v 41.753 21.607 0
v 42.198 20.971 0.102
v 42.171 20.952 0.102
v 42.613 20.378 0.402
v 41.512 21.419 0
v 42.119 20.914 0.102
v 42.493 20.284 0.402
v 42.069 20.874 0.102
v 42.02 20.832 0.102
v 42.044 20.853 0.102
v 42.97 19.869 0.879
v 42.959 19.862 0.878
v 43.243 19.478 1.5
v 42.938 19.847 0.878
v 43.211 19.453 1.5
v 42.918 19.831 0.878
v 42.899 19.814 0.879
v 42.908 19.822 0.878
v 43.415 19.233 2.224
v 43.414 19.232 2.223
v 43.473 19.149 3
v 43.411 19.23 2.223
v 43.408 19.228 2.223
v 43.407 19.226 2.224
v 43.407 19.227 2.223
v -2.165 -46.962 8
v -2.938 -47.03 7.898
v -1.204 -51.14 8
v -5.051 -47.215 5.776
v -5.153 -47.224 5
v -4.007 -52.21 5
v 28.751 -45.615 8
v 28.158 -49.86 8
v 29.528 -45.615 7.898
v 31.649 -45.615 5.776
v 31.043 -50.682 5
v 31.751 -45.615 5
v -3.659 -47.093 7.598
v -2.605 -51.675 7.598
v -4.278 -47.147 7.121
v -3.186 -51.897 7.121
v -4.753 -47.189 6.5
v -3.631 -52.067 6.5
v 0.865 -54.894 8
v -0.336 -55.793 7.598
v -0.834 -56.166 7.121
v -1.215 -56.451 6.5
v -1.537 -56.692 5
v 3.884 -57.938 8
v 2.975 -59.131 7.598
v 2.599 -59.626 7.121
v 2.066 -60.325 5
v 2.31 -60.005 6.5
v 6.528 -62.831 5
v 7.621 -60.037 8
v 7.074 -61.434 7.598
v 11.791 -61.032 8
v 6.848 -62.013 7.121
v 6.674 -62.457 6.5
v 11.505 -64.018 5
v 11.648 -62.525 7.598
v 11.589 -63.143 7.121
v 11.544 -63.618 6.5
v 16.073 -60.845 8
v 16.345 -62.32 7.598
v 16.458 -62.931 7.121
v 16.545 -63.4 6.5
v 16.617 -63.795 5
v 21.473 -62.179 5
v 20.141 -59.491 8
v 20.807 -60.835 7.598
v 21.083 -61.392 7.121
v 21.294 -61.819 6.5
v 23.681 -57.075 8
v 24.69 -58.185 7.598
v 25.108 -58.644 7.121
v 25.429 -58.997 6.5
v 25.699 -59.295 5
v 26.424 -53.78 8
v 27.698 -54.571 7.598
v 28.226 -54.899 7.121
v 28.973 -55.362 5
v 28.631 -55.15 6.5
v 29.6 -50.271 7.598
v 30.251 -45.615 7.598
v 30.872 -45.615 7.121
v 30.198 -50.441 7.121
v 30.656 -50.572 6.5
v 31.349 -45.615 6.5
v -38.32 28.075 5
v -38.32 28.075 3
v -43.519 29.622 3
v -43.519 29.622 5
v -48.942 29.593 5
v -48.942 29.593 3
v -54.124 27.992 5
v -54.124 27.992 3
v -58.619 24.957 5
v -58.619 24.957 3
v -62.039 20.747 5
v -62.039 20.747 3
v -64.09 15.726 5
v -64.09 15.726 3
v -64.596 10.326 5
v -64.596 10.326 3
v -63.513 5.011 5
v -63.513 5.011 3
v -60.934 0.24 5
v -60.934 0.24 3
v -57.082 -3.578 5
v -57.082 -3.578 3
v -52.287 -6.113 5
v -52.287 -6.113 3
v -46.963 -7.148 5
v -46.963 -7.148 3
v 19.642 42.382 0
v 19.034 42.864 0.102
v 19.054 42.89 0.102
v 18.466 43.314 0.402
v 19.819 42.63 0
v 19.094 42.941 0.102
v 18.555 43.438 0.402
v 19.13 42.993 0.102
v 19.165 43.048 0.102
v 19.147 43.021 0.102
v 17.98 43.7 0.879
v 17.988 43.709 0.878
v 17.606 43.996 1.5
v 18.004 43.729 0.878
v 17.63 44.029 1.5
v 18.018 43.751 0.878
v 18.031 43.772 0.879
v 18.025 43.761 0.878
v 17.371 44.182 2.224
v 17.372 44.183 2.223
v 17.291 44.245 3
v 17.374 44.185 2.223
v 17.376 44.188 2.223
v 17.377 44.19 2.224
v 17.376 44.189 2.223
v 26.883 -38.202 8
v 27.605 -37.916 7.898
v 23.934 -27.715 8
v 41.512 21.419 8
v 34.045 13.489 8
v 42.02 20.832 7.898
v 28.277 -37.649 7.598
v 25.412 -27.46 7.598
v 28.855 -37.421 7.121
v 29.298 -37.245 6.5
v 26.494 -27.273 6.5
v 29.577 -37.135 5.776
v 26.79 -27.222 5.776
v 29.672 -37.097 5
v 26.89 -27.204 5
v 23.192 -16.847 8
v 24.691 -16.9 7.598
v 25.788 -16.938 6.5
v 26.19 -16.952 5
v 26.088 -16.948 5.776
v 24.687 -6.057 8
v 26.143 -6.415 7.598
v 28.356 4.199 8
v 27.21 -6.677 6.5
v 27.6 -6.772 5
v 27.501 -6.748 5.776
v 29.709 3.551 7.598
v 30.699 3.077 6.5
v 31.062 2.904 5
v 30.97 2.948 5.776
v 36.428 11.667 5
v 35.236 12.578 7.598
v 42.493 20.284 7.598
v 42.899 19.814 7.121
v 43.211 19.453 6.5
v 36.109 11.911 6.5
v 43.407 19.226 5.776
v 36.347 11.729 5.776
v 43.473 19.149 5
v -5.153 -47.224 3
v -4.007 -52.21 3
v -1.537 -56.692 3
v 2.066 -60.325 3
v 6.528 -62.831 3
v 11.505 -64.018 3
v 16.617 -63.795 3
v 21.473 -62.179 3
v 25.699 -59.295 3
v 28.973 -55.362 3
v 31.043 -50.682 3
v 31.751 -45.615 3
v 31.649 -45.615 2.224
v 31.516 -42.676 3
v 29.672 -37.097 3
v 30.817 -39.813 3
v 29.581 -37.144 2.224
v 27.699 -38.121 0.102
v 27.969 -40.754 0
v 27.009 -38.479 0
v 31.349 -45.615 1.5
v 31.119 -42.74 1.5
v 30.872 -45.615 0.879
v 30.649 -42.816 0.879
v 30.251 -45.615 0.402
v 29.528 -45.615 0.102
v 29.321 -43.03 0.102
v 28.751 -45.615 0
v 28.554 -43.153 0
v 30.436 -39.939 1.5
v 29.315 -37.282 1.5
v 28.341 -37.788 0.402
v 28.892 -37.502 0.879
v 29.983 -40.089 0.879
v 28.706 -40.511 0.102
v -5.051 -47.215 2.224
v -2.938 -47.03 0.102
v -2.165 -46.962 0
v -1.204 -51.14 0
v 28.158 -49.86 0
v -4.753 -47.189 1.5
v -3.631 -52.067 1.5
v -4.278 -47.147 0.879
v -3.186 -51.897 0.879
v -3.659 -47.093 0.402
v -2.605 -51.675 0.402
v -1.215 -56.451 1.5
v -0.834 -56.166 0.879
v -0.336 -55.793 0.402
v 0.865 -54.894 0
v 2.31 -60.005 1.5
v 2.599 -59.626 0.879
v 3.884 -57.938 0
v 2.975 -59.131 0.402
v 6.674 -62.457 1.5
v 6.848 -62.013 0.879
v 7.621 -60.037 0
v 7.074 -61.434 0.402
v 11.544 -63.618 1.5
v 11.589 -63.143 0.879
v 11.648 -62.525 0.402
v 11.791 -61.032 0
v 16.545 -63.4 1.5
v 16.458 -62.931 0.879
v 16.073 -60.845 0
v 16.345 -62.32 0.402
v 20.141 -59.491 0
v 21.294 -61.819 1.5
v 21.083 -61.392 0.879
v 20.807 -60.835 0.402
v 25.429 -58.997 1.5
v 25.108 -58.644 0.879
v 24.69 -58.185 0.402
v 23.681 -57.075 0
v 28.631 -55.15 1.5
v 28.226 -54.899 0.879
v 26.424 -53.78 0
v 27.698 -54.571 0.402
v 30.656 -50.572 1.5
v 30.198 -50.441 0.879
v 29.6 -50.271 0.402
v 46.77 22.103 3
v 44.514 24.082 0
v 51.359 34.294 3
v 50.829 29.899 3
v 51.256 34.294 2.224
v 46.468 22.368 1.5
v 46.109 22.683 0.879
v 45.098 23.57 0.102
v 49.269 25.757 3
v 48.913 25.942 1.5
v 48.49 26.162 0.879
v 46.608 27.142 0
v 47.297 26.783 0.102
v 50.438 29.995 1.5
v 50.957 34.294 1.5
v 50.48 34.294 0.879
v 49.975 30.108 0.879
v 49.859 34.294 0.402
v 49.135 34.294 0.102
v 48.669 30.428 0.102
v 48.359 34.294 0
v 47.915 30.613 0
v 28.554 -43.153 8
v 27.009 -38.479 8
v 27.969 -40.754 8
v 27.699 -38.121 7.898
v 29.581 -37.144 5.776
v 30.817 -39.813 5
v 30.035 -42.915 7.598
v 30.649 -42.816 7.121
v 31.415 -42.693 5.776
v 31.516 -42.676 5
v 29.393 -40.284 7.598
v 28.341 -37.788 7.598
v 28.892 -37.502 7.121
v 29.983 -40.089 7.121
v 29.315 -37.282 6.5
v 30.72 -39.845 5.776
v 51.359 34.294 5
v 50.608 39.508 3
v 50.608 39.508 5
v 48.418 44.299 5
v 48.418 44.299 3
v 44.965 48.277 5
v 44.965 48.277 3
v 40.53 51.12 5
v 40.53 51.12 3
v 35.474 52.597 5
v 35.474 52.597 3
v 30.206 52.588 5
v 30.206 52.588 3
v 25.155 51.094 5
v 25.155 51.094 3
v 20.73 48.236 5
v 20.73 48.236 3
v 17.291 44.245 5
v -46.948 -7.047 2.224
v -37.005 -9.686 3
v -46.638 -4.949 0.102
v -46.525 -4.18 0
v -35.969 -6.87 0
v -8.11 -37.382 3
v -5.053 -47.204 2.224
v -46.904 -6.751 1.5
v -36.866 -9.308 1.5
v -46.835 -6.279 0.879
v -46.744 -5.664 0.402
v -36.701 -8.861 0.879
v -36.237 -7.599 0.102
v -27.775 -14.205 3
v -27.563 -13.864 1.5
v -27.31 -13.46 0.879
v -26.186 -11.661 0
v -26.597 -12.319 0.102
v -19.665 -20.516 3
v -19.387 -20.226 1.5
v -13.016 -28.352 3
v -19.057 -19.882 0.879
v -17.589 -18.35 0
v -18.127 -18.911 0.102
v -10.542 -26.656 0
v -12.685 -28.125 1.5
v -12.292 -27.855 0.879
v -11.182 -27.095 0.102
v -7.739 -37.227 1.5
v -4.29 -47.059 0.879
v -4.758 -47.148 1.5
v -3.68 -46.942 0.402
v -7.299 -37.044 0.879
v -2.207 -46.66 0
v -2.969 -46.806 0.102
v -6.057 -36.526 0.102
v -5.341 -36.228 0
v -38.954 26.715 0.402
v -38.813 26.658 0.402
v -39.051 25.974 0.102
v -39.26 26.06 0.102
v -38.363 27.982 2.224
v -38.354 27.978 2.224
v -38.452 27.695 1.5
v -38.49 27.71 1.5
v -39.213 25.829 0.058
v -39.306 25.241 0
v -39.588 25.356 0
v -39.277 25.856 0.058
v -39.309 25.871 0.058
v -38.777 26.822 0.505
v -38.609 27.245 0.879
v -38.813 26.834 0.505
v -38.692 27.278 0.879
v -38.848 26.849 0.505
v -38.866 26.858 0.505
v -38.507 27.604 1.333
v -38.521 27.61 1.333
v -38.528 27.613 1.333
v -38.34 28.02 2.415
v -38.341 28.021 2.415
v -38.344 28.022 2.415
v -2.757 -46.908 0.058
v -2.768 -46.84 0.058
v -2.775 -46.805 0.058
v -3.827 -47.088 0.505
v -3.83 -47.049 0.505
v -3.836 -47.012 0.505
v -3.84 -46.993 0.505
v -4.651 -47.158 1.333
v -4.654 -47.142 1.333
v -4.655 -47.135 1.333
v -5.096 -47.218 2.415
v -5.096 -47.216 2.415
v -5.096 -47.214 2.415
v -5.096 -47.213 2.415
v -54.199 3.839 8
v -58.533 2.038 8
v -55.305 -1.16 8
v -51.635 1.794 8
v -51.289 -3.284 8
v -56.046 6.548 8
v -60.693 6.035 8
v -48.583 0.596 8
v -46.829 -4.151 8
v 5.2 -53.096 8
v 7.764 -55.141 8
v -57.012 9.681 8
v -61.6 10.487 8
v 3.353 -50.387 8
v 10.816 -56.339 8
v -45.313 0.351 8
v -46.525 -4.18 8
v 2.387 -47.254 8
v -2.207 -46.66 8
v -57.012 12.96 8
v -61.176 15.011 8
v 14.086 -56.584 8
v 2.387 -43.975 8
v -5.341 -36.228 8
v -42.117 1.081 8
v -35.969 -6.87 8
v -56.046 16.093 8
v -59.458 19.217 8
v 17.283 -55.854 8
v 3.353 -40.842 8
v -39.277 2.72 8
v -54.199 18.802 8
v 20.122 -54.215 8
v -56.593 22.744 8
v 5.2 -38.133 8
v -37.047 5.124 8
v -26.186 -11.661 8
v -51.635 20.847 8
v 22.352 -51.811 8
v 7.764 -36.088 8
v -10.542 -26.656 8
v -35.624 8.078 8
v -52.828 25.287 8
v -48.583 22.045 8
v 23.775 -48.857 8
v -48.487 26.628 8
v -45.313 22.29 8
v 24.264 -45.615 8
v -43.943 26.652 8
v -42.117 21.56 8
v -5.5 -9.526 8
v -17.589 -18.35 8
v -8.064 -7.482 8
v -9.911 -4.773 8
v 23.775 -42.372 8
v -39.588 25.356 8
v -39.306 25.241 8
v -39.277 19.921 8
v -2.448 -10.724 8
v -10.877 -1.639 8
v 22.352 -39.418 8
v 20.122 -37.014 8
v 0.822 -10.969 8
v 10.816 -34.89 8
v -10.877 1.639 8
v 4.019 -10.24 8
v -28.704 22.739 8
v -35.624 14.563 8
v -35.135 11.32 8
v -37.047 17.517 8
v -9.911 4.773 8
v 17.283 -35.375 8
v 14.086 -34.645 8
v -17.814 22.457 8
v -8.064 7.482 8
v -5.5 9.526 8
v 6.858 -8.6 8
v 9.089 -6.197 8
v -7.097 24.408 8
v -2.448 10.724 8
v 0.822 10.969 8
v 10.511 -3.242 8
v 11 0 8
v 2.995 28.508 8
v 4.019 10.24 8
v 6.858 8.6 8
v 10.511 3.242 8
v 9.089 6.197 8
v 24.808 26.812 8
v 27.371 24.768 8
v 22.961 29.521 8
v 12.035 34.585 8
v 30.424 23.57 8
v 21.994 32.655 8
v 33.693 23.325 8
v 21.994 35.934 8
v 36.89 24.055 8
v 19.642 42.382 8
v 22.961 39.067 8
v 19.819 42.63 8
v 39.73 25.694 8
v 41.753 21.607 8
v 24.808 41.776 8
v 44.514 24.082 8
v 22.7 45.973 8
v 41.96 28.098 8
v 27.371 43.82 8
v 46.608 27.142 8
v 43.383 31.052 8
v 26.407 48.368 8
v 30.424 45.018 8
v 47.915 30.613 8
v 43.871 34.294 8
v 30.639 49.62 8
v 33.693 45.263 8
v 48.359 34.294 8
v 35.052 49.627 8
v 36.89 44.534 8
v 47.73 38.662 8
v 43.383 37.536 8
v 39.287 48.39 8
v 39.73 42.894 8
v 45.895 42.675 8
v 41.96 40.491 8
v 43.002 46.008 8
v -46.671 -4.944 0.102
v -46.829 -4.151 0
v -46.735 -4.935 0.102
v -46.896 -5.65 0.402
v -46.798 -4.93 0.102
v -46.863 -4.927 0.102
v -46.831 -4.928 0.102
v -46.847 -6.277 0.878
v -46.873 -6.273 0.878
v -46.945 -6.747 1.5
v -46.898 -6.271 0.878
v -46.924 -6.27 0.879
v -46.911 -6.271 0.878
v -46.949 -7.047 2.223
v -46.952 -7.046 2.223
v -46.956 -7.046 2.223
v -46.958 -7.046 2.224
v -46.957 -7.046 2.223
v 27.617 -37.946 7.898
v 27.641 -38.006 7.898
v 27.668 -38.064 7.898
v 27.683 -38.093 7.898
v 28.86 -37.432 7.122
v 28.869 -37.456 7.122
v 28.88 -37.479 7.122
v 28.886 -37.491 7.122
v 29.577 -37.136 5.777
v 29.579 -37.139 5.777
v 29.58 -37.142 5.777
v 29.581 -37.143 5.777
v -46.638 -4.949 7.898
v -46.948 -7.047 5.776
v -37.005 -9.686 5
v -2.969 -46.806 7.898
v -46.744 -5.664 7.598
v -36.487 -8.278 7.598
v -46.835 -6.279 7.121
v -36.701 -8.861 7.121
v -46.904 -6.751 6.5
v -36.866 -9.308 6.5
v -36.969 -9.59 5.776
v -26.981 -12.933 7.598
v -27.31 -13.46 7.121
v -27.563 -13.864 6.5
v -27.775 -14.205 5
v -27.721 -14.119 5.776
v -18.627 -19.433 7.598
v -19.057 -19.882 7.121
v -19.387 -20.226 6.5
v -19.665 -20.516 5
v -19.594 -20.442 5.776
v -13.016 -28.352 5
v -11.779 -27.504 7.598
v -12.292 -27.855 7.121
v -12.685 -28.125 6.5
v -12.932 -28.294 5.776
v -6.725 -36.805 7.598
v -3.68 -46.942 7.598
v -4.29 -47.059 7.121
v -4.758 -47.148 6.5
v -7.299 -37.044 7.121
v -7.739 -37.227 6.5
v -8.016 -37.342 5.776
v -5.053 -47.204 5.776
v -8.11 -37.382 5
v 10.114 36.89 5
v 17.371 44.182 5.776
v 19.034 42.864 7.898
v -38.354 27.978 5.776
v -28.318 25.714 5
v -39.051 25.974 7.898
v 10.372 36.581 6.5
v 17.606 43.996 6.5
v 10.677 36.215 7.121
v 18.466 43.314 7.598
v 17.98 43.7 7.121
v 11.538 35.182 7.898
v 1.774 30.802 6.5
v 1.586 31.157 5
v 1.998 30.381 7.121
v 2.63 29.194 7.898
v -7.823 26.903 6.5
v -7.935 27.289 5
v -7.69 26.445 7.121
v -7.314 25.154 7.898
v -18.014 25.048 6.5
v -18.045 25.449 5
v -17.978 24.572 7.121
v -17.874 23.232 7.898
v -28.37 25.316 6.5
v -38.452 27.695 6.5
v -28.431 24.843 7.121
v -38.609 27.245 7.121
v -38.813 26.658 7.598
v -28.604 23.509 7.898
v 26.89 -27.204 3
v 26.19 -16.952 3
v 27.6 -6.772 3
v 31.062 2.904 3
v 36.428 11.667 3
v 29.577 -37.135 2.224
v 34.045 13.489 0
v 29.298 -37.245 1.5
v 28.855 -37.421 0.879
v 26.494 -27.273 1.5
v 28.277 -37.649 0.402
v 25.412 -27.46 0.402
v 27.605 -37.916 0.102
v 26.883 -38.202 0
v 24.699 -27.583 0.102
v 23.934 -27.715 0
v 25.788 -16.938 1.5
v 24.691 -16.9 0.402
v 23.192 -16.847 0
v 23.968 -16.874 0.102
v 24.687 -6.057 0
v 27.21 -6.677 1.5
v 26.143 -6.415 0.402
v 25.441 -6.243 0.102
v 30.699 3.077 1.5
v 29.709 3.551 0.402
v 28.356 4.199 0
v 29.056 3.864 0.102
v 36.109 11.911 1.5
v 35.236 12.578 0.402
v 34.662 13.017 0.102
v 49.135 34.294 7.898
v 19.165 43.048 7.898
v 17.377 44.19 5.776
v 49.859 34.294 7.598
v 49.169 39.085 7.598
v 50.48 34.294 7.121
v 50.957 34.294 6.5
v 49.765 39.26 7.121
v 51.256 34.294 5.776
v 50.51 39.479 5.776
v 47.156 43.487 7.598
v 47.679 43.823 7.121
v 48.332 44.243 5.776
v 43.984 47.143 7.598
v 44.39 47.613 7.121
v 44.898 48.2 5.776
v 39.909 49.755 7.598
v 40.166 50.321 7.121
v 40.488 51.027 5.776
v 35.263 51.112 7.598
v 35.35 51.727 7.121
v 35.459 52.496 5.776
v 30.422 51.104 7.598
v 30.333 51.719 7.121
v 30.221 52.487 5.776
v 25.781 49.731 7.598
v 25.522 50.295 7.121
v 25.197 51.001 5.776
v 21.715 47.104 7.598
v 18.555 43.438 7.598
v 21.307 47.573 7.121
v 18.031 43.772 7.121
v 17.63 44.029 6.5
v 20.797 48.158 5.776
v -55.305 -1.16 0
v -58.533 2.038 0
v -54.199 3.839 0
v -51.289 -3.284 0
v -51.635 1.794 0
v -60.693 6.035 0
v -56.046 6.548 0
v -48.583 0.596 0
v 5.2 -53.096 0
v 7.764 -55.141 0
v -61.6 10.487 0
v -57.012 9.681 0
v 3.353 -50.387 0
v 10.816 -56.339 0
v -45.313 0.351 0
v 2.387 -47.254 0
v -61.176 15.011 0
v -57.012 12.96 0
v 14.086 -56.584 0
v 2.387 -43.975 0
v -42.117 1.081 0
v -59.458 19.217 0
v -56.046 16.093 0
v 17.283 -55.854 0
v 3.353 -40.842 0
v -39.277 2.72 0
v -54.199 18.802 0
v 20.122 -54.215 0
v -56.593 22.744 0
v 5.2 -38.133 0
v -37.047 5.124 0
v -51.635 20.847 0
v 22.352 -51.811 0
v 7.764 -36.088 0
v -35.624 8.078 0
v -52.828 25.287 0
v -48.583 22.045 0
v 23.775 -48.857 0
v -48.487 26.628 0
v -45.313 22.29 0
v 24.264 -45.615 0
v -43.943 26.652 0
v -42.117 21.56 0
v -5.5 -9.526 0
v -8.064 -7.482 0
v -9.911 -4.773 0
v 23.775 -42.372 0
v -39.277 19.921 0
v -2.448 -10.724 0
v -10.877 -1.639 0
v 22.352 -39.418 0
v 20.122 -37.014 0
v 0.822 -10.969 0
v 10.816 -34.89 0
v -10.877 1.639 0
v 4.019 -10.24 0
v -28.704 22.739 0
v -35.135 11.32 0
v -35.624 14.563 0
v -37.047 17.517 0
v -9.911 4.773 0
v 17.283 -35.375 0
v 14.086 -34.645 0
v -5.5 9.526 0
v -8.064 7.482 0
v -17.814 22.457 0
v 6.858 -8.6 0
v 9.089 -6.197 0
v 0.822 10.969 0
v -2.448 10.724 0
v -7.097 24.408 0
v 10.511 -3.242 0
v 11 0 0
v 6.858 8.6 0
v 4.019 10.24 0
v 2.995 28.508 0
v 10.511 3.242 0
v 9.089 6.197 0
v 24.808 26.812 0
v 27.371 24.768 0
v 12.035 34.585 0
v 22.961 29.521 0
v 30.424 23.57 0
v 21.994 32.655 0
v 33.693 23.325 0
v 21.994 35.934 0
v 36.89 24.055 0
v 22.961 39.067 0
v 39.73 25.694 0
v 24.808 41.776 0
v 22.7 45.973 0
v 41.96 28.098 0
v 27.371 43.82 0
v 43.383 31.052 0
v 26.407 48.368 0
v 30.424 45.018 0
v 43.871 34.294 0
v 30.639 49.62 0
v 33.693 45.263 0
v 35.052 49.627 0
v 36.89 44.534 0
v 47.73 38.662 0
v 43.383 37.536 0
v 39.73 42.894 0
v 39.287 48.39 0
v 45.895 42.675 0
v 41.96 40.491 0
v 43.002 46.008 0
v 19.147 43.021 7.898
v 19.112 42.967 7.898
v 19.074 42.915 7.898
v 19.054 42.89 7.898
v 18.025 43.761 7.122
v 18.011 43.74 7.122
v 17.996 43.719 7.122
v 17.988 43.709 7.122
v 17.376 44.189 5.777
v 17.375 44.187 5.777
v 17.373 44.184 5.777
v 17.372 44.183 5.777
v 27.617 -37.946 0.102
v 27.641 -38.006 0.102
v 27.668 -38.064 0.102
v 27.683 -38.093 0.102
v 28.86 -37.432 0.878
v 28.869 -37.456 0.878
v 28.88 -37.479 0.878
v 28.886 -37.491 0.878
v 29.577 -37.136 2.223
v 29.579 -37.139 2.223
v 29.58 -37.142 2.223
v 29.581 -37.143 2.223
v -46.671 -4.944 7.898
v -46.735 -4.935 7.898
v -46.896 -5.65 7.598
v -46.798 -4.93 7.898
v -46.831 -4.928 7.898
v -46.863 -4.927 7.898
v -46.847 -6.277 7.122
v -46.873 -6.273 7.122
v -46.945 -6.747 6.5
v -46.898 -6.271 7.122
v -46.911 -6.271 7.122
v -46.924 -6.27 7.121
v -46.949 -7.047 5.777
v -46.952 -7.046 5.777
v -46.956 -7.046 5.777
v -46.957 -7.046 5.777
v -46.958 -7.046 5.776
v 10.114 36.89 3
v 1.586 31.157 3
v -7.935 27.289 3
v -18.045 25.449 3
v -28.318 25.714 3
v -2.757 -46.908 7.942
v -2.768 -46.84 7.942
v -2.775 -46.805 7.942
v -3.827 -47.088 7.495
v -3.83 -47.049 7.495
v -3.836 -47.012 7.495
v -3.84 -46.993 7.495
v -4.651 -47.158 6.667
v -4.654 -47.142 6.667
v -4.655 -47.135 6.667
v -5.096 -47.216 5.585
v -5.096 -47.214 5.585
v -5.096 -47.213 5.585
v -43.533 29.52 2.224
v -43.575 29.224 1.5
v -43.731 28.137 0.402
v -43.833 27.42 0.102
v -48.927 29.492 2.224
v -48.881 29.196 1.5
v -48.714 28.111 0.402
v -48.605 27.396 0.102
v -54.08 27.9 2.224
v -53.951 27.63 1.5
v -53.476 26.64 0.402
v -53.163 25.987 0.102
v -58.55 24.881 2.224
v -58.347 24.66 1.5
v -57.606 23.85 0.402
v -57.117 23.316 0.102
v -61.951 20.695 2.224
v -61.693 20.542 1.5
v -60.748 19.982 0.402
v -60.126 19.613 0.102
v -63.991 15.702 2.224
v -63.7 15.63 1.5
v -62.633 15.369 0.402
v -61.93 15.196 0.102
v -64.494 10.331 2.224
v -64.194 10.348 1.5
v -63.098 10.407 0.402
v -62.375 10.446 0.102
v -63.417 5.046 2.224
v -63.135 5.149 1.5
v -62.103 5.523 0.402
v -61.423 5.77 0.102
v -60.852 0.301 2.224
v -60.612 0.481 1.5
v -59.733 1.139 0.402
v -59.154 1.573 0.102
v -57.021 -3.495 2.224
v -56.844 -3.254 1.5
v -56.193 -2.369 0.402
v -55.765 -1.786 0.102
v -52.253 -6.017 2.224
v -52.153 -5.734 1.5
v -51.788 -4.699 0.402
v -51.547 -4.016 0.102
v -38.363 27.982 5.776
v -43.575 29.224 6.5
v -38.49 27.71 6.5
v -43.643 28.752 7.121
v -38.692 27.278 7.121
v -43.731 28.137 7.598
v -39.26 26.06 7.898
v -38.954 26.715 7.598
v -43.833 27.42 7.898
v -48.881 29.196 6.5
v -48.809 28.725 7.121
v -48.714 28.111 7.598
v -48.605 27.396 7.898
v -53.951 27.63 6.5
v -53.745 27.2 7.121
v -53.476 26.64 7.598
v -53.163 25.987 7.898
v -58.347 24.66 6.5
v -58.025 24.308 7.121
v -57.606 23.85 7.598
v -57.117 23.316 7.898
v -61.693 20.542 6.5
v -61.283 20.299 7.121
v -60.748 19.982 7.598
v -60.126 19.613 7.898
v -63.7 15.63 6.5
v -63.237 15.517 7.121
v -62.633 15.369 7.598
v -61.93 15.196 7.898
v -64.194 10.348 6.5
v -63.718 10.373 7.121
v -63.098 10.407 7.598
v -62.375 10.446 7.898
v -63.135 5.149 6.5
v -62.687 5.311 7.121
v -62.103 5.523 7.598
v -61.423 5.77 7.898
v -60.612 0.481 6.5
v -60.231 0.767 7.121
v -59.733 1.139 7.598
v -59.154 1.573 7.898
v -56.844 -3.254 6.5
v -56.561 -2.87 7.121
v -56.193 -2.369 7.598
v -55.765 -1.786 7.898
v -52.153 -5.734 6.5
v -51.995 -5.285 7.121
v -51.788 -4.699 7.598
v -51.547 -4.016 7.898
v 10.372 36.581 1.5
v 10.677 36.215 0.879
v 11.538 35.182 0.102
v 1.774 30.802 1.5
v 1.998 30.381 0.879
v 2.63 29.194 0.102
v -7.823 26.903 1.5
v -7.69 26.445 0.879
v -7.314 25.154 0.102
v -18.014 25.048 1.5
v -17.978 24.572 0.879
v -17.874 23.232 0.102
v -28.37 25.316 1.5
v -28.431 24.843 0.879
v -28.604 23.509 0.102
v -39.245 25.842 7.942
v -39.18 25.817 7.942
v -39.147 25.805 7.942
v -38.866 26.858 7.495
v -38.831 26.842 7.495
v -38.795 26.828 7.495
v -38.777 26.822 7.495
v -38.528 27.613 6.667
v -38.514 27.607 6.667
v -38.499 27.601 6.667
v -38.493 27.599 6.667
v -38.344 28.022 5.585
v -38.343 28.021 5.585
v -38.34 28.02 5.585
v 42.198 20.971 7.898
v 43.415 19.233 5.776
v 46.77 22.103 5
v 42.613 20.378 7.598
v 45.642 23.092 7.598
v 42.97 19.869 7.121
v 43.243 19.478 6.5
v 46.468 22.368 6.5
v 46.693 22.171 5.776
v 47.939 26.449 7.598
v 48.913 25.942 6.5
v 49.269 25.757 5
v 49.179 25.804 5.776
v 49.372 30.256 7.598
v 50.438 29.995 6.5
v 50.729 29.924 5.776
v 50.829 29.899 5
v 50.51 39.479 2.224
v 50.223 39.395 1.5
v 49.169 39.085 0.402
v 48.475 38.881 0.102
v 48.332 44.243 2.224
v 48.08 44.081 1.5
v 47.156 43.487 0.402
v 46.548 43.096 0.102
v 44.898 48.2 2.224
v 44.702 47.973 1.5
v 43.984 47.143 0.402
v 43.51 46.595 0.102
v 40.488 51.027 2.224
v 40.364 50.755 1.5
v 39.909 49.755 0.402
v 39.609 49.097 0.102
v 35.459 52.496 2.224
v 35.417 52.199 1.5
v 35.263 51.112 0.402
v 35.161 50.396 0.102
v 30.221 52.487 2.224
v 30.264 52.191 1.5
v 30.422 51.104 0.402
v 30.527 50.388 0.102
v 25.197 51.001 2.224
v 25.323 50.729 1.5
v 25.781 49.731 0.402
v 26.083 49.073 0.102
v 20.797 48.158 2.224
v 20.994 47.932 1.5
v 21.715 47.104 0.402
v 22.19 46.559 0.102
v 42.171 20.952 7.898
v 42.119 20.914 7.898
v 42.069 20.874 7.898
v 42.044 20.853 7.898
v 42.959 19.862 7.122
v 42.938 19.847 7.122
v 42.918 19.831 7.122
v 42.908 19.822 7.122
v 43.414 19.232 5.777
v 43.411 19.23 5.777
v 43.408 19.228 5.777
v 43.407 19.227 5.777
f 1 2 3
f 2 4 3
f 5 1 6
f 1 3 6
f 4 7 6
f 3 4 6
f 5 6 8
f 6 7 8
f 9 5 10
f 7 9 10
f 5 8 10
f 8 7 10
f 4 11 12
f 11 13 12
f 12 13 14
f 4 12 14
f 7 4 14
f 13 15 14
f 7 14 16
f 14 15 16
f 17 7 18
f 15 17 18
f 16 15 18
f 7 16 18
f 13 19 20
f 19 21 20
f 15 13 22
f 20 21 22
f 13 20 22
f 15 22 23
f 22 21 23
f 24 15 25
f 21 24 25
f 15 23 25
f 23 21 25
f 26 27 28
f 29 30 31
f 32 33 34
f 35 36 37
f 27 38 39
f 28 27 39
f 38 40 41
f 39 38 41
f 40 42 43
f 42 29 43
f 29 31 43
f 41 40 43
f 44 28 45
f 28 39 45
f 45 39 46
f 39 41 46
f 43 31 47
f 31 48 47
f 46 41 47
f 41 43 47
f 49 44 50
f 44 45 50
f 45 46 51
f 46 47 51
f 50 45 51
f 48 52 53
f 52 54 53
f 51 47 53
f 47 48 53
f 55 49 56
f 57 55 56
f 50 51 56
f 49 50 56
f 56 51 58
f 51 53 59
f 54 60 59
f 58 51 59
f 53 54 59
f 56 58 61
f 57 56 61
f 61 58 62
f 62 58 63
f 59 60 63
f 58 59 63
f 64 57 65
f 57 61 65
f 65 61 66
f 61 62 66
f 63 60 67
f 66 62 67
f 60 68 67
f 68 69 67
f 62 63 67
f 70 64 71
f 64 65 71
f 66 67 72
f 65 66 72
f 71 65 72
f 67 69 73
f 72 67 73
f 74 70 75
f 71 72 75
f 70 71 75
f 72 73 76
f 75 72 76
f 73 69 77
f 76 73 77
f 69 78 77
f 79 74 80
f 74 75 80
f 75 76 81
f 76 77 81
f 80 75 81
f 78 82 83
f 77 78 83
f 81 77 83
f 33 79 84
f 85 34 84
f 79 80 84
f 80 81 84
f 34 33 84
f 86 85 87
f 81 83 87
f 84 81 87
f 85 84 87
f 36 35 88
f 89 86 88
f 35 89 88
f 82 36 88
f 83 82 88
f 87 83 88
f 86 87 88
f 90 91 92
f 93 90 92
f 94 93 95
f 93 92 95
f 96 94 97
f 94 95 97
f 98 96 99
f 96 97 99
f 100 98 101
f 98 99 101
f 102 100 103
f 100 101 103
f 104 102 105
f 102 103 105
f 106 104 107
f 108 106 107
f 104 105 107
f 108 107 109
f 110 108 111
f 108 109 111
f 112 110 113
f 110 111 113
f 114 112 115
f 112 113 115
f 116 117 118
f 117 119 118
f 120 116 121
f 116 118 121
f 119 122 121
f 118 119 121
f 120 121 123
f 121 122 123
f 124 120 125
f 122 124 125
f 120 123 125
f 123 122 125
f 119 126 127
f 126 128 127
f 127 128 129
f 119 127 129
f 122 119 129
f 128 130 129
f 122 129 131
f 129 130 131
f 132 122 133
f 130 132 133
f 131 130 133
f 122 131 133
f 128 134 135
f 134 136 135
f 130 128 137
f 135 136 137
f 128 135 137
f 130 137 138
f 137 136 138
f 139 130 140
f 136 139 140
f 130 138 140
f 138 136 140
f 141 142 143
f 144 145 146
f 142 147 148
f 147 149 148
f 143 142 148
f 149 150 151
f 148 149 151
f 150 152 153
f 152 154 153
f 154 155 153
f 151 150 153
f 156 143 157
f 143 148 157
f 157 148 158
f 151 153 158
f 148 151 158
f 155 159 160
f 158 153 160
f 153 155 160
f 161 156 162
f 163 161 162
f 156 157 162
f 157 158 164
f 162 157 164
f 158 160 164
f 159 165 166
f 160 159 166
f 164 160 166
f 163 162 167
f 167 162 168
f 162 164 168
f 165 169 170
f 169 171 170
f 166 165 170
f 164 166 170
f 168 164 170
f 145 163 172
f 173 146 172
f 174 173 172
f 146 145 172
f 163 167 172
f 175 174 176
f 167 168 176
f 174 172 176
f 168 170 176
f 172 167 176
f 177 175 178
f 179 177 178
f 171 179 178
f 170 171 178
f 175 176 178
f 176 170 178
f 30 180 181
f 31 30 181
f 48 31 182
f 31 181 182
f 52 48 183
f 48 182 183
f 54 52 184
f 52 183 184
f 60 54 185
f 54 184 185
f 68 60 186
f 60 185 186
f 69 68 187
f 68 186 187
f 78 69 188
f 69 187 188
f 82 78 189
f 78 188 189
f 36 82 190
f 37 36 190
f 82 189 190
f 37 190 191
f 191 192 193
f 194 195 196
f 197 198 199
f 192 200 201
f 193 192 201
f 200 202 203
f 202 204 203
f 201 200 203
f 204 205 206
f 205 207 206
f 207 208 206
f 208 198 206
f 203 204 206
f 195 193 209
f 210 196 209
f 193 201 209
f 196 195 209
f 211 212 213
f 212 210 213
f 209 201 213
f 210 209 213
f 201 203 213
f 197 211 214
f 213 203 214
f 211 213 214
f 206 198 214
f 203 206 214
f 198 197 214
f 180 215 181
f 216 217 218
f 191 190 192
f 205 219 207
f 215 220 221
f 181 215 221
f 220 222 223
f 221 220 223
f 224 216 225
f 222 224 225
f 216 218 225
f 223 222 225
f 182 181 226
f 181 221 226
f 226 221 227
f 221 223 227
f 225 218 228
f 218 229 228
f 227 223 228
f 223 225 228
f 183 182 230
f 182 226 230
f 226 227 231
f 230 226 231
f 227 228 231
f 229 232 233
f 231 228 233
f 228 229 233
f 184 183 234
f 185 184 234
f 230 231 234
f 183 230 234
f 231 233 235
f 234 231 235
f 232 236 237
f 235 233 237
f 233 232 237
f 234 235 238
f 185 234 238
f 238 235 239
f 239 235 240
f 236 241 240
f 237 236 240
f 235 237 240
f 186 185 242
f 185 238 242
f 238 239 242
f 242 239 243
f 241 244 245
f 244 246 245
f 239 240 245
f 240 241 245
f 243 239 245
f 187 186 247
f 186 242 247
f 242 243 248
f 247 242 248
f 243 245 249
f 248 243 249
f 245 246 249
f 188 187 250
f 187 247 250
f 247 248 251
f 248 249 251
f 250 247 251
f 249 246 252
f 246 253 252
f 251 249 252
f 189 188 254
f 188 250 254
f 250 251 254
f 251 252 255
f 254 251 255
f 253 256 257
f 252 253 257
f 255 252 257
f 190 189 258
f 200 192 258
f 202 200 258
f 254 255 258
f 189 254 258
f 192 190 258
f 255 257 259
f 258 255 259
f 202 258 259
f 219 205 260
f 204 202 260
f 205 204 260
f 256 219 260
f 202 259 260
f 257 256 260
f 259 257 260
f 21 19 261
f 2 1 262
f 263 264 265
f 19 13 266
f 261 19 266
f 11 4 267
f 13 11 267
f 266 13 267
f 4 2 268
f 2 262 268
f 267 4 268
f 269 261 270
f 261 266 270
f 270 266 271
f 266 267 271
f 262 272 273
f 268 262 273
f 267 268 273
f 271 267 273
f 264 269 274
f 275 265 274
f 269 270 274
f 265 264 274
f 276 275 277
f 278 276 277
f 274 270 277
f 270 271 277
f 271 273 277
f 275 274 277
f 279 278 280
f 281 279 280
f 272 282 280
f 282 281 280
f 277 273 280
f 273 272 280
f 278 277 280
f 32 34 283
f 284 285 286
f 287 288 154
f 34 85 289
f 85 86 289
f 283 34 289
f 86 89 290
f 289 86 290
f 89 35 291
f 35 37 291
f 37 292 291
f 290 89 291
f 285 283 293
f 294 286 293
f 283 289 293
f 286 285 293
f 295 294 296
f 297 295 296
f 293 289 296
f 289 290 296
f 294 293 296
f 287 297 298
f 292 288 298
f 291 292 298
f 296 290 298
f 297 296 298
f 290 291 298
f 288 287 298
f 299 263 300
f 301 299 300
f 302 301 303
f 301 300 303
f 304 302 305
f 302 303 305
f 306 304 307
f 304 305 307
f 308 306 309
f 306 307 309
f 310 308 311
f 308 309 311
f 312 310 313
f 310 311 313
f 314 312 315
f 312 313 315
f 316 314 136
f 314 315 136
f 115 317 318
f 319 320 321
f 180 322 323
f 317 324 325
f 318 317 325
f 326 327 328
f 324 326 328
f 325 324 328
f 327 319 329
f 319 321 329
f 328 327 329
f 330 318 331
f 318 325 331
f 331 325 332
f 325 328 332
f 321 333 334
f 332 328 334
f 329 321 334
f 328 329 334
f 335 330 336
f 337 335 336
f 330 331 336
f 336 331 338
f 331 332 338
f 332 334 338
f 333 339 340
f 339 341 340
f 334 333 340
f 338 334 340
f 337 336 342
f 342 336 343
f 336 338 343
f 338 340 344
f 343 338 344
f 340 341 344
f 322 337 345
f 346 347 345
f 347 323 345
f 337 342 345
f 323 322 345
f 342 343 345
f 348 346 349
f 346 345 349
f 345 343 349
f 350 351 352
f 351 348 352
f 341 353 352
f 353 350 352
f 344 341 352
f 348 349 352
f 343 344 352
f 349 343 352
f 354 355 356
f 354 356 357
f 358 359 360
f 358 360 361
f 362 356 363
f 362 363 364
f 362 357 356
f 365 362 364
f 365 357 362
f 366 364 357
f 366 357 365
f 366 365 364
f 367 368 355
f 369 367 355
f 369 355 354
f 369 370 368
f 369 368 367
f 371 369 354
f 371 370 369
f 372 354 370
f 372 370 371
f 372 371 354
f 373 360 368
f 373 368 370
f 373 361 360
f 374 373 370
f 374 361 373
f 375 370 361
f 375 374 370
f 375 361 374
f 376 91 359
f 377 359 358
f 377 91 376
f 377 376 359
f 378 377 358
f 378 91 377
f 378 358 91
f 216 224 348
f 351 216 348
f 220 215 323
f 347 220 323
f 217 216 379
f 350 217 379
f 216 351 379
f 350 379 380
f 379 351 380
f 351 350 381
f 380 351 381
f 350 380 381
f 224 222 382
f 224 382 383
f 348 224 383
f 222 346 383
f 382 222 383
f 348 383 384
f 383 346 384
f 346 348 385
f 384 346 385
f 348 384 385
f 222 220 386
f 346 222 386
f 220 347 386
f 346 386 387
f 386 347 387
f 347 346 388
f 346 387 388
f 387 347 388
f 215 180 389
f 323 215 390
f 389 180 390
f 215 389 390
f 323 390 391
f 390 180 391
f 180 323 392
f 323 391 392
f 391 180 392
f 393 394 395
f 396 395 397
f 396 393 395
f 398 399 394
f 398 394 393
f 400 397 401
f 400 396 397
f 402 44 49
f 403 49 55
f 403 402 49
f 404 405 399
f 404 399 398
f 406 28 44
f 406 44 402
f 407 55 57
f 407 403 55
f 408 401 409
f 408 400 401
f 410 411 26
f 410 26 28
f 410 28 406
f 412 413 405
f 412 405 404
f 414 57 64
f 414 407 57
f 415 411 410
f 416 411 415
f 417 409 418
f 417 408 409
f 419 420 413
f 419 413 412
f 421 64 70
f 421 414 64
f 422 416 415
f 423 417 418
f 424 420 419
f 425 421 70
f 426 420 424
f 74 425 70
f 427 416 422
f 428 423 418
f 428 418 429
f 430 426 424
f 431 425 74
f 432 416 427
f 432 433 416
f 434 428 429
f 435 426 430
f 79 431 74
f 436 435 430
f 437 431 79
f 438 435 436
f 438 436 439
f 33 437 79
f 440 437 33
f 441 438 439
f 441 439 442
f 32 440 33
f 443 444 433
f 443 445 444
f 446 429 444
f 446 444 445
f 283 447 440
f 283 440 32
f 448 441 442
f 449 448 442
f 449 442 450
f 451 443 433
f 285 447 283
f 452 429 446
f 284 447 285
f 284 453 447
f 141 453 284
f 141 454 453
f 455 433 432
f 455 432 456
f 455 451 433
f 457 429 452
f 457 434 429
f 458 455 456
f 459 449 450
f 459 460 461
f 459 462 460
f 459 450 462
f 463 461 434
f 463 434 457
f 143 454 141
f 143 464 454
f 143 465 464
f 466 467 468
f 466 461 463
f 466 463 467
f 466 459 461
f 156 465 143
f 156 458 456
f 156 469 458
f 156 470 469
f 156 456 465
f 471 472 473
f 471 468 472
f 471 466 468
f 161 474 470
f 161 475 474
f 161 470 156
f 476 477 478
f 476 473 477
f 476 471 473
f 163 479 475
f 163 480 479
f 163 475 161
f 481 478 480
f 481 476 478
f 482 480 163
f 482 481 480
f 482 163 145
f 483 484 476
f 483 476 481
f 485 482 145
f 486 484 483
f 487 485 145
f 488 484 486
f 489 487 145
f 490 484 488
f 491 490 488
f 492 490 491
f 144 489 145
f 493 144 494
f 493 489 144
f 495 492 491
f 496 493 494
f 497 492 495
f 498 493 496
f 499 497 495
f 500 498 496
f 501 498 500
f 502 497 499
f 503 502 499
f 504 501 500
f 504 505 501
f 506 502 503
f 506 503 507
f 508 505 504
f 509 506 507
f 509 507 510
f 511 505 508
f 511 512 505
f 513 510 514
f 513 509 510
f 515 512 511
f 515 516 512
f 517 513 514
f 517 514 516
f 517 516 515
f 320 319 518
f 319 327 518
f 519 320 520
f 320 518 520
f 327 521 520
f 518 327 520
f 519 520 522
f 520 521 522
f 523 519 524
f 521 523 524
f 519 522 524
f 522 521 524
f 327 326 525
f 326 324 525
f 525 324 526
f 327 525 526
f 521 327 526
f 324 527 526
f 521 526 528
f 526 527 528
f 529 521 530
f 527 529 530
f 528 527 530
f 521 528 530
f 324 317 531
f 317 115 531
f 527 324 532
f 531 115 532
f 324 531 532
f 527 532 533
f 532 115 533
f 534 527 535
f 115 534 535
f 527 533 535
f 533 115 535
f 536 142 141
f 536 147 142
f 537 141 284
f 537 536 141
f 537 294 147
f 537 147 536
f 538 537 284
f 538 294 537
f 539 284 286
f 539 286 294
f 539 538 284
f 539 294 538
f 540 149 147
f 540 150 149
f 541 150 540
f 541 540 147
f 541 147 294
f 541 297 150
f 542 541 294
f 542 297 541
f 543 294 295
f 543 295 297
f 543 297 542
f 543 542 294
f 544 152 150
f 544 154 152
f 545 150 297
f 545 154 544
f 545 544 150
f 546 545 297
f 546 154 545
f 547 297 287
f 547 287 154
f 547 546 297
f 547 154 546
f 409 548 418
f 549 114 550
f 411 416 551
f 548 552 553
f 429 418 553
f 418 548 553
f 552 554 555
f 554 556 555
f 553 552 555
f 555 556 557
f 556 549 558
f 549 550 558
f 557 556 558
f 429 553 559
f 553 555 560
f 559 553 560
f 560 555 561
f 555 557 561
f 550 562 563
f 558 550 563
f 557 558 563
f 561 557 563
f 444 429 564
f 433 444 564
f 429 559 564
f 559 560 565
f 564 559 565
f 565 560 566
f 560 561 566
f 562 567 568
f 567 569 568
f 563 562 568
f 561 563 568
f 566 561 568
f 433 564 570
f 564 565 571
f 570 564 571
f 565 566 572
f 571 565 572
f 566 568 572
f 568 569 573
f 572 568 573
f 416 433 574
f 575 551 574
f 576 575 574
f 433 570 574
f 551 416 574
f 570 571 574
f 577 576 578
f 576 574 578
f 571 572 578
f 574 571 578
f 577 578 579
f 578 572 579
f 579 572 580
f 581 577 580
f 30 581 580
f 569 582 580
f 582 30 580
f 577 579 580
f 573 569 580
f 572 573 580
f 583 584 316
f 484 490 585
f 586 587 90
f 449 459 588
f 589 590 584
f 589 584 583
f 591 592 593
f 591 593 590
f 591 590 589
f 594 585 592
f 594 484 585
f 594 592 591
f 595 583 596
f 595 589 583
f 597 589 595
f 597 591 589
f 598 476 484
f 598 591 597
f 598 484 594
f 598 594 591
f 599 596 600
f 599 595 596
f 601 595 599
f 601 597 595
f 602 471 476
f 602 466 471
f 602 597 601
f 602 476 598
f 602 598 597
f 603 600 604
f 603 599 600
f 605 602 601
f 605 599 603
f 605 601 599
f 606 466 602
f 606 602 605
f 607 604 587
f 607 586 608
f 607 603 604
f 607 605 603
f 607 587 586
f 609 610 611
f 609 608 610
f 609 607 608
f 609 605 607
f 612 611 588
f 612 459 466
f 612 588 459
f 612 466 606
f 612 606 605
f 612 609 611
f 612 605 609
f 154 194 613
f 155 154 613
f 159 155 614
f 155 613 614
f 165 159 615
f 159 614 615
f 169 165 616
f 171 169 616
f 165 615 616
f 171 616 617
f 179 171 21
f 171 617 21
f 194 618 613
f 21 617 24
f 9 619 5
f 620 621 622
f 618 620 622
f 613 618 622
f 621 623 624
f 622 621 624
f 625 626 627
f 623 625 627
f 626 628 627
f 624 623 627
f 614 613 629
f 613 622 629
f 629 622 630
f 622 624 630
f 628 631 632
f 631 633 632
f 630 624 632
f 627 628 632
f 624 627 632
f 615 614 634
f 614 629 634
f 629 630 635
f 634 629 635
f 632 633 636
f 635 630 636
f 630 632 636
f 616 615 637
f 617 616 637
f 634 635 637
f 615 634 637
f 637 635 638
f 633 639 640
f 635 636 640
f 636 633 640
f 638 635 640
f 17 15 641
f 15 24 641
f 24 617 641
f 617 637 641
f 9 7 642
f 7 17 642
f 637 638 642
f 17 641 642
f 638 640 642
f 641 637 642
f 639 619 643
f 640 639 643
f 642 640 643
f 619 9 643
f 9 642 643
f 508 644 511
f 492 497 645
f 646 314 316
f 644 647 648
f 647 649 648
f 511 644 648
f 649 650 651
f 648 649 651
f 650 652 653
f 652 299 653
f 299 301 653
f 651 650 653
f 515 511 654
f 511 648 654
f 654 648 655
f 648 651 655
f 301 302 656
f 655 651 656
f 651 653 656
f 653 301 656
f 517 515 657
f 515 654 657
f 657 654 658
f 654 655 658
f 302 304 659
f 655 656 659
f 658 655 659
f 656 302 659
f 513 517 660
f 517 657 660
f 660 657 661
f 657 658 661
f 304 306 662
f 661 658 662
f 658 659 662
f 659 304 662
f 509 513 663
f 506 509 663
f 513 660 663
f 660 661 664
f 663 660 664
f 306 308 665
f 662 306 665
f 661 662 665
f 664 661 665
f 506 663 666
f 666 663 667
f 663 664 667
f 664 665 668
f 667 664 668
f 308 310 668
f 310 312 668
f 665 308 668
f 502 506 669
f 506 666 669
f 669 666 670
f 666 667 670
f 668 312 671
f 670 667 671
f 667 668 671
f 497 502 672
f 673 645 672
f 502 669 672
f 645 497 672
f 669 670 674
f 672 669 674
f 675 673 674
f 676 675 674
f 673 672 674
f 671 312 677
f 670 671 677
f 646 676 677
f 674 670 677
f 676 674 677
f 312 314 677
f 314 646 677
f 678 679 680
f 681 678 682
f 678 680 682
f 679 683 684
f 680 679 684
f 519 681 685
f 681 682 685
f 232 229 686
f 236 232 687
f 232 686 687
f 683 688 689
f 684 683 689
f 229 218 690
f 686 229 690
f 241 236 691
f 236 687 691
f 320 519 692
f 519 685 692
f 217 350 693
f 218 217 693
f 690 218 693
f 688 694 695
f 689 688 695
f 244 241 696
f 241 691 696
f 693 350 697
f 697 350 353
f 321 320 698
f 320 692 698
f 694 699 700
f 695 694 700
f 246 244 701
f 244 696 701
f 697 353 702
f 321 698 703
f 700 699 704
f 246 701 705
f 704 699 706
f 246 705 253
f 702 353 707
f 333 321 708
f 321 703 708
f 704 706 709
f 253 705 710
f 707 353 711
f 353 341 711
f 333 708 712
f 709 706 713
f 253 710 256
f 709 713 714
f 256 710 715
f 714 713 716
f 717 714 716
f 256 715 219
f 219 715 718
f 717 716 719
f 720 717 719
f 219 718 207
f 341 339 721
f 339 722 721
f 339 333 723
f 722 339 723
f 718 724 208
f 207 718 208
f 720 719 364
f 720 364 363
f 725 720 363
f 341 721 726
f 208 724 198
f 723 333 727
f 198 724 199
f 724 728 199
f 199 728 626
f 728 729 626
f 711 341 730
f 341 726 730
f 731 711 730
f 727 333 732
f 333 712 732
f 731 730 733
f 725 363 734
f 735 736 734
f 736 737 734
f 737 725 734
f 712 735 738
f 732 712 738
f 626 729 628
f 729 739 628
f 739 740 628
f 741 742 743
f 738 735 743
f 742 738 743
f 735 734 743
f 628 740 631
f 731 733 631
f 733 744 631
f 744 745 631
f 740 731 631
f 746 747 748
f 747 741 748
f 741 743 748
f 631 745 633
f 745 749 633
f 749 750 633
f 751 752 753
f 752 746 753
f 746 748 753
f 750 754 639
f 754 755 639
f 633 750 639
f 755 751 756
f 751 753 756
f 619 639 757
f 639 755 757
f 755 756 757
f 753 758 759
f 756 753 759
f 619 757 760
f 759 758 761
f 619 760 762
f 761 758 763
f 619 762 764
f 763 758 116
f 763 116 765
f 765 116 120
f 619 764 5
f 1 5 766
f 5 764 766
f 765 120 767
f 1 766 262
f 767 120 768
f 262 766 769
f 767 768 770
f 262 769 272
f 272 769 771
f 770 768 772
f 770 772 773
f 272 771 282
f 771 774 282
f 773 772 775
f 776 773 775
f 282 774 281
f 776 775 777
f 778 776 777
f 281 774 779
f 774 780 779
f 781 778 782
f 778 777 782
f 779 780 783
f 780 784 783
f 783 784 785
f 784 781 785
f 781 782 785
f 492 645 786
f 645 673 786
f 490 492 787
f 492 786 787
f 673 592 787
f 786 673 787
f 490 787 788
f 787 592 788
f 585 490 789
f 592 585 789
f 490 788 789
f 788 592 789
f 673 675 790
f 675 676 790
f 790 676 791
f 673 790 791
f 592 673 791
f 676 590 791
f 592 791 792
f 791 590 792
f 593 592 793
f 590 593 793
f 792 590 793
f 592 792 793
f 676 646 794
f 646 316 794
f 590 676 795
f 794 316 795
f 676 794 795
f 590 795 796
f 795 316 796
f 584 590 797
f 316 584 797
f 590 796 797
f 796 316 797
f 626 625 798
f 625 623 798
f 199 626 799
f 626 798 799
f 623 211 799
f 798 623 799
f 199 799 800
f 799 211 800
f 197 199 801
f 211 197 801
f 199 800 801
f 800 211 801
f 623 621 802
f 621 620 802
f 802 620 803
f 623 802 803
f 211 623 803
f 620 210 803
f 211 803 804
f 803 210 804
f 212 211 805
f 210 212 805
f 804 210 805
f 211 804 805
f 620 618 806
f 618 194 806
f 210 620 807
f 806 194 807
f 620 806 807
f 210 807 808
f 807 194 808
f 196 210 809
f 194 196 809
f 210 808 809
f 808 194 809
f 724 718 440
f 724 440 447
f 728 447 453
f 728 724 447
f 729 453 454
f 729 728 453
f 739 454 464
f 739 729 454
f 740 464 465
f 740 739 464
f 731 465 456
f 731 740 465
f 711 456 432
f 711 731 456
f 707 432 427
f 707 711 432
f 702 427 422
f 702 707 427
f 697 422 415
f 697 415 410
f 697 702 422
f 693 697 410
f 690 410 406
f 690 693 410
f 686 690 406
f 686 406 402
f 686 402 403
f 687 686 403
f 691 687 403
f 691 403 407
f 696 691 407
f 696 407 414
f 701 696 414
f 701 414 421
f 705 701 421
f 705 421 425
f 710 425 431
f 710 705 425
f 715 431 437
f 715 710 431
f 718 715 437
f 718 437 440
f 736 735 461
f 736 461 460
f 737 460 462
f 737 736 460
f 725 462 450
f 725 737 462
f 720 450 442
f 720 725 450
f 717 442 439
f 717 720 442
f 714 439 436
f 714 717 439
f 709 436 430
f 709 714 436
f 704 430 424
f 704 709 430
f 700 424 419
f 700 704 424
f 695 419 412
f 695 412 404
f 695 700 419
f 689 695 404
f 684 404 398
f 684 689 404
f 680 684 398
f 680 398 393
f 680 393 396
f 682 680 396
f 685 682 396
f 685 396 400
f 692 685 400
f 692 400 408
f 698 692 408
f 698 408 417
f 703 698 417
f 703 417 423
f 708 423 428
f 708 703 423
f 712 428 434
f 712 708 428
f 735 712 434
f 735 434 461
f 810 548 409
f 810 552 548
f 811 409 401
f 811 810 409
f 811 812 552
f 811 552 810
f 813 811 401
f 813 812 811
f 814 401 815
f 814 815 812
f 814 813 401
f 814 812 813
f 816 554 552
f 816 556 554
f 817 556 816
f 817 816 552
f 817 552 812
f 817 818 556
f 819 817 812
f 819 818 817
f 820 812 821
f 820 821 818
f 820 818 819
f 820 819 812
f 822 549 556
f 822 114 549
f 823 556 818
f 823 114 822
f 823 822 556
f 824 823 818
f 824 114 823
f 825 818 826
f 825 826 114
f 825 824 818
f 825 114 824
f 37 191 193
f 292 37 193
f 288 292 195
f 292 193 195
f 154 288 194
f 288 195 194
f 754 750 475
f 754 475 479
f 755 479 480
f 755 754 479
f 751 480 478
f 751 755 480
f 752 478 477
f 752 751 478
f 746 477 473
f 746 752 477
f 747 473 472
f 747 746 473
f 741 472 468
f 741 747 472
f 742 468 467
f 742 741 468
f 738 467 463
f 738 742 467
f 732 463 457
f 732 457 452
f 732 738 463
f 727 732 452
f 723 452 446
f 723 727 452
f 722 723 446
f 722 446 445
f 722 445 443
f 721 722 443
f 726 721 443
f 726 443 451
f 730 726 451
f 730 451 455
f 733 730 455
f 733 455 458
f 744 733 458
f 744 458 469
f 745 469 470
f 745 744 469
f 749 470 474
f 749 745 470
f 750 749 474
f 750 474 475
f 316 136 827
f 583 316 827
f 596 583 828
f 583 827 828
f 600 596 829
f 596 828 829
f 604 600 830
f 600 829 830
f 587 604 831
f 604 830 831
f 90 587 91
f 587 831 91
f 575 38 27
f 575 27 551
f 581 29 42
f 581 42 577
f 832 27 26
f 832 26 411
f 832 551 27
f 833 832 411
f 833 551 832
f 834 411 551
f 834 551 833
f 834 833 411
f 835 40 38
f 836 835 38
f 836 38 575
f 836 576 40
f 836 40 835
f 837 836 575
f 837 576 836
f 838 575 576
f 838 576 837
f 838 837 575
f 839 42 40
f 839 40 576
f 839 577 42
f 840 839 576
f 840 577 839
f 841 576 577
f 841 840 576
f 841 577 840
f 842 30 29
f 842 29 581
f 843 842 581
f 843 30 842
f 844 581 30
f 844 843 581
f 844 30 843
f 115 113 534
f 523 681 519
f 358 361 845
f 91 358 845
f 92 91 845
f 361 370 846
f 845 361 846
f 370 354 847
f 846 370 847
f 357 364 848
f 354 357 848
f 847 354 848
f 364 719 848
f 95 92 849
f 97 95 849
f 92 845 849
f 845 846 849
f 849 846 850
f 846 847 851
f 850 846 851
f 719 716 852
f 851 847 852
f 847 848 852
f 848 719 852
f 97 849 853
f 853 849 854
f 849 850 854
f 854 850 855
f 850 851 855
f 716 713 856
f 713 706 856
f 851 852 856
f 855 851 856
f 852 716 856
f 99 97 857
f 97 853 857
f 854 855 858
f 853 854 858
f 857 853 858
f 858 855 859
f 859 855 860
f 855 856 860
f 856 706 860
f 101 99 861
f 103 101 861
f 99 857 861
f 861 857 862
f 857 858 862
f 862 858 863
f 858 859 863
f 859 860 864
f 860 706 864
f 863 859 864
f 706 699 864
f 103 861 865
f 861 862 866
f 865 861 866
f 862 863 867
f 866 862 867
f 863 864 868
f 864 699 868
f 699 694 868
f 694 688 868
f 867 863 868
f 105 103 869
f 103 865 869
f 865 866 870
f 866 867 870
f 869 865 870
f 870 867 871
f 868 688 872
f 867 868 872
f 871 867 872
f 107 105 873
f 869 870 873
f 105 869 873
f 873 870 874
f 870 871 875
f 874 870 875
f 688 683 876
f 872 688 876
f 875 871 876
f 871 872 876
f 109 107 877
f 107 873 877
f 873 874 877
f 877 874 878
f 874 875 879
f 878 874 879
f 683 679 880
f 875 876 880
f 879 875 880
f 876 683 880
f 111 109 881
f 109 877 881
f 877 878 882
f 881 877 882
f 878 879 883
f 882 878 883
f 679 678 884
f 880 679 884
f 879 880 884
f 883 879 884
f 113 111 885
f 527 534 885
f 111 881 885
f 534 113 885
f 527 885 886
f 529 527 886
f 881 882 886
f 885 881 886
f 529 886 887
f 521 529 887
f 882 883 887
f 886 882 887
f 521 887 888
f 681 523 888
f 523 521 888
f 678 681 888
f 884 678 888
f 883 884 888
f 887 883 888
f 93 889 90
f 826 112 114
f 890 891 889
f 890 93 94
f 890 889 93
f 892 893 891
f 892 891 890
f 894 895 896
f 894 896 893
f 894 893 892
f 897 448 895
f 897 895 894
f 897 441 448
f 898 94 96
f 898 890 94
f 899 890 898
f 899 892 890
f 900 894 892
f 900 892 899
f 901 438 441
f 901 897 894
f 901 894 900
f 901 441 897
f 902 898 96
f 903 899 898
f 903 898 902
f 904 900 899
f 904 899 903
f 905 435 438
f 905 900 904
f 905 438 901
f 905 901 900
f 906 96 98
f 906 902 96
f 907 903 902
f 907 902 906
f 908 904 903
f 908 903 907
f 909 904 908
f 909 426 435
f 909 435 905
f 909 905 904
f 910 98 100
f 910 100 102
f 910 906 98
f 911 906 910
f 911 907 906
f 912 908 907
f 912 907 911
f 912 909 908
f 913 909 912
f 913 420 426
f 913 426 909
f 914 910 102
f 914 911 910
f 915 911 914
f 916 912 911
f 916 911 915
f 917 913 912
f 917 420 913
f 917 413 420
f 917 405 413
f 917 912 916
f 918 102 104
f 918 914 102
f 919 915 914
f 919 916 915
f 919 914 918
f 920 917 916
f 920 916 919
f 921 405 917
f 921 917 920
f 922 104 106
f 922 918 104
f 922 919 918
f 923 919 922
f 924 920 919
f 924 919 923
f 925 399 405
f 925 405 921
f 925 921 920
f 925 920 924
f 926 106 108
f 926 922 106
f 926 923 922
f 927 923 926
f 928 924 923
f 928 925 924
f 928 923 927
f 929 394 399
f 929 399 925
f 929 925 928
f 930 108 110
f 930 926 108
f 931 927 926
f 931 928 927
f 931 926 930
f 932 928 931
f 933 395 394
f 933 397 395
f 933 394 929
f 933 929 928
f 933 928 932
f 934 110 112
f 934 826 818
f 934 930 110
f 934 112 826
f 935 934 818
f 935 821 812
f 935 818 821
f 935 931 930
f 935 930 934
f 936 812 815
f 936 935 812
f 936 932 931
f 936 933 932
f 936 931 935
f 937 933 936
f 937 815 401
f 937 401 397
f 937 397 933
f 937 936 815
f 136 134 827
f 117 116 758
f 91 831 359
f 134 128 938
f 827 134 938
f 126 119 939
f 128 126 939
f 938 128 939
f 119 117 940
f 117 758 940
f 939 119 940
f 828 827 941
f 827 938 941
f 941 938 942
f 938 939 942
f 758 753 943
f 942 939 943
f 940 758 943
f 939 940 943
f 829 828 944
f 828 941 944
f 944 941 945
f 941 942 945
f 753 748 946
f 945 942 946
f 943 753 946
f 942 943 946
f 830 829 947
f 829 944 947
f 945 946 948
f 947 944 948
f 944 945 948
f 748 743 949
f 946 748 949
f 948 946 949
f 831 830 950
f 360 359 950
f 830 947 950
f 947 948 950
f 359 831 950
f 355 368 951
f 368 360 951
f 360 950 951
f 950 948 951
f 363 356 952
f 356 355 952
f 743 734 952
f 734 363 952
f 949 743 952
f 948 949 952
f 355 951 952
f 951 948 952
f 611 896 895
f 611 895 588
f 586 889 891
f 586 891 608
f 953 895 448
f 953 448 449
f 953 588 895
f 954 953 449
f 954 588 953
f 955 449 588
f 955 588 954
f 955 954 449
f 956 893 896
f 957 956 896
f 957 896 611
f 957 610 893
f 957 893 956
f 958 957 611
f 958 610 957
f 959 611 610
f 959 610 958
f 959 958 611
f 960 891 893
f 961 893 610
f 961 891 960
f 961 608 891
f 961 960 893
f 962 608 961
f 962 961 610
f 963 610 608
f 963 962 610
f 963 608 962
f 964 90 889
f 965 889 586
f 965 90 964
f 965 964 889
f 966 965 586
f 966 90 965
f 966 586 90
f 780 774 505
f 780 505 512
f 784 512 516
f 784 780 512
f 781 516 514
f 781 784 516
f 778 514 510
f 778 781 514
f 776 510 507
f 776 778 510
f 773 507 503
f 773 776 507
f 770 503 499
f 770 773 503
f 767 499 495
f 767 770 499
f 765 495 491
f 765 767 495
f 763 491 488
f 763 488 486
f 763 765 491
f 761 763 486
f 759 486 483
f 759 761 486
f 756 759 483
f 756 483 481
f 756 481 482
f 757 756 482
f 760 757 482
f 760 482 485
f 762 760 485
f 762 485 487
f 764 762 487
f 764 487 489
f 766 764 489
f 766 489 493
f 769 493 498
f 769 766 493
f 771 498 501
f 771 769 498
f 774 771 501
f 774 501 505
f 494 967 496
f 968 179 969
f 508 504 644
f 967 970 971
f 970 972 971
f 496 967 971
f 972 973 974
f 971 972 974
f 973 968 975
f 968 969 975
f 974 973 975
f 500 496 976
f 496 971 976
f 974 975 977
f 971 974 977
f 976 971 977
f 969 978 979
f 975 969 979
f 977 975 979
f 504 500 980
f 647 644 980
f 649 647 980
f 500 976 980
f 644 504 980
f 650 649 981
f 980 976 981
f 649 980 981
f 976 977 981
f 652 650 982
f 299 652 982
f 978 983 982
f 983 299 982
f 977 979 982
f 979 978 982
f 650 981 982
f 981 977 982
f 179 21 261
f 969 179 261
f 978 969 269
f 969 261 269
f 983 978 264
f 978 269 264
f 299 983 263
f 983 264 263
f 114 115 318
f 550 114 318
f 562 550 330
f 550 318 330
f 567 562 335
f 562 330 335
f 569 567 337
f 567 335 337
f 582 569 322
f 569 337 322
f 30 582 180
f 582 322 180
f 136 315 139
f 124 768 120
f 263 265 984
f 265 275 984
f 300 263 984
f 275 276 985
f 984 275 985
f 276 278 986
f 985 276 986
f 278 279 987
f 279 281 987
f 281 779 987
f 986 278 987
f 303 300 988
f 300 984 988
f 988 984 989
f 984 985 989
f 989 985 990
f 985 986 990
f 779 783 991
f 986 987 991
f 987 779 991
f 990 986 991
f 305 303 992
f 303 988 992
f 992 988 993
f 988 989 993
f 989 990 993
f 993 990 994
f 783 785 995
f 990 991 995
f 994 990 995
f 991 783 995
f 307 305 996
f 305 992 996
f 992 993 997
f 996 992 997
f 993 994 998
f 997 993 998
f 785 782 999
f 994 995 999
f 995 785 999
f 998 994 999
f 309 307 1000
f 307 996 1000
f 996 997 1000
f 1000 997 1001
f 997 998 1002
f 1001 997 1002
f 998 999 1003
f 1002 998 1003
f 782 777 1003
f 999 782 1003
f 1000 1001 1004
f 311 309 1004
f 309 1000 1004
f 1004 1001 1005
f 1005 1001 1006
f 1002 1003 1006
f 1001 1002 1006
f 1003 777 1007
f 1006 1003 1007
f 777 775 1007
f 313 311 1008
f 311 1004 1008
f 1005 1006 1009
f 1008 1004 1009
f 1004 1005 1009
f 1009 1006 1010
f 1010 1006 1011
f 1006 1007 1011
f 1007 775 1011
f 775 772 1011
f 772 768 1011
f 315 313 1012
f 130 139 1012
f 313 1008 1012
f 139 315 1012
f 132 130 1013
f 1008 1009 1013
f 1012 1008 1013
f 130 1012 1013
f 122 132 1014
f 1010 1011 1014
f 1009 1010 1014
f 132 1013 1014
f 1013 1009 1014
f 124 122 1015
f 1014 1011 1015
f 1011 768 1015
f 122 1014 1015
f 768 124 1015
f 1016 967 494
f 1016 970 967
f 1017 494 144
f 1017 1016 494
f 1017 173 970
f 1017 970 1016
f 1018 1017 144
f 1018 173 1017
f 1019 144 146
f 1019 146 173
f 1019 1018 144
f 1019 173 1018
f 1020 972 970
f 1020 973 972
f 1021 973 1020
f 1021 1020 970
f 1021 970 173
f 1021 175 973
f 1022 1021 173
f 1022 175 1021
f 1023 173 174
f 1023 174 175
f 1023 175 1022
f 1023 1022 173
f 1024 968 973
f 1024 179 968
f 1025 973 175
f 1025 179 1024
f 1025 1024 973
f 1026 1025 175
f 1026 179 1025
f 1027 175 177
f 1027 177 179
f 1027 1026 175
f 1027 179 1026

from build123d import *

# Parameters (mm, degrees)
F0_R     = 11
F1_DEPTH = 8
F2_R     = 3


with BuildPart() as f1:
    # F0 (on Top) → F1 (new body)
    with BuildSketch(Plane.XY):
        with BuildLine():
            ThreePointArc((-46.9629723988, -7.1482733789), (-33.3588141853, -2.0414398613), (-27.6480459467, 11.3204460609))
            ThreePointArc((-27.6480459467, 11.3204460609), (-30.5426885779, 21.2526685211), (-38.32015897, 28.0746149634))
            ThreePointArc((-38.32015897, 28.0746149634), (-64.0899437078, 15.7260648458), (-46.9629723988, -7.1482733789))
        make_face()
        with Locations((-46.1353019911, 11.3204460609)):
            Circle(F0_R, mode=Mode.SUBTRACT)
        with BuildLine():
            ThreePointArc((-38.32015897, 28.0746149634), (-30.5426885779, 21.2526685211), (-27.6480459467, 11.3204460609))
            ThreePointArc((-27.6480459467, 11.3204460609), (-33.3588141853, -2.0414398613), (-46.9629723988, -7.1482733789))
            ThreePointArc((-46.9629723988, -7.1482733789), (-19.665142242, -20.516249302), (-5.1532502747, -47.2235386268))
            ThreePointArc((-5.1532502747, -47.2235386268), (8.1019140534, -27.8625813311), (29.6720725387, -37.0969904451))
            ThreePointArc((29.6720725387, -37.0969904451), (27.6001642069, -6.7723880996), (43.4734092447, 19.1489236634))
            ThreePointArc((43.4734092447, 19.1489236634), (20.0787462211, 20.947754055), (17.29089986, 44.245263824))
            ThreePointArc((17.29089986, 44.245263824), (-7.9350219649, 27.2886374016), (-38.32015897, 28.0746149634))
        make_face()
        Circle(F0_R, mode=Mode.SUBTRACT)
        with BuildLine():
            ThreePointArc((51.3587009109, 34.2941205051), (38.0549336147, 52.0398264772), (17.29089986, 44.245263824))
            ThreePointArc((17.29089986, 44.245263824), (20.0787462211, 20.947754055), (43.4734092447, 19.1489236634))
            ThreePointArc((43.4734092447, 19.1489236634), (49.2693085396, 25.756632408), (51.3587009109, 34.2941205051))
        make_face()
        with Locations((32.8714448665, 34.2941205051)):
            Circle(F0_R, mode=Mode.SUBTRACT)
        with BuildLine():
            ThreePointArc((29.6720725387, -37.0969904451), (8.1019140534, -27.8625813311), (-5.1532502747, -47.2235386268))
            ThreePointArc((-5.1532502747, -47.2235386268), (14.0691073846, -64.0842771233), (31.751113169, -45.614566566))
            ThreePointArc((31.751113169, -45.614566566), (31.2238336787, -41.2307465162), (29.6720725387, -37.0969904451))
        make_face()
        with Locations((13.2638571246, -45.614566566)):
            Circle(F0_R, mode=Mode.SUBTRACT)
    extrude(amount=F1_DEPTH)

    # F2 (call 1 of 2: OpenCascade refuses the feature's edges together)
    f2_edges = [f1.edges().sort_by_distance(p)[0] for p in [
        (-7.935022, 27.288637, 0),
        (45.664144, 47.640487, 0),
        (27.600164, -6.772388, 0),
        (18.4258, -63.366552, 0),
        (-19.665142, -20.516249, 0),
        (-64.089944, 15.726065, 0),
    ]]
    fillet(f2_edges, radius=F2_R)

    # F2#2 (call 2 of 2)
    f2_2_edges = [f1.edges().sort_by_distance(p)[0] for p in [
        (45.664144, 47.640487, 8),
        (27.600164, -6.772388, 8),
        (18.4258, -63.366552, 8),
        (-19.665142, -20.516249, 8),
        (-64.089944, 15.726065, 8),
        (-7.935022, 27.288637, 8),
    ]]
    fillet(f2_2_edges, radius=F2_R)


solid = f1.part
